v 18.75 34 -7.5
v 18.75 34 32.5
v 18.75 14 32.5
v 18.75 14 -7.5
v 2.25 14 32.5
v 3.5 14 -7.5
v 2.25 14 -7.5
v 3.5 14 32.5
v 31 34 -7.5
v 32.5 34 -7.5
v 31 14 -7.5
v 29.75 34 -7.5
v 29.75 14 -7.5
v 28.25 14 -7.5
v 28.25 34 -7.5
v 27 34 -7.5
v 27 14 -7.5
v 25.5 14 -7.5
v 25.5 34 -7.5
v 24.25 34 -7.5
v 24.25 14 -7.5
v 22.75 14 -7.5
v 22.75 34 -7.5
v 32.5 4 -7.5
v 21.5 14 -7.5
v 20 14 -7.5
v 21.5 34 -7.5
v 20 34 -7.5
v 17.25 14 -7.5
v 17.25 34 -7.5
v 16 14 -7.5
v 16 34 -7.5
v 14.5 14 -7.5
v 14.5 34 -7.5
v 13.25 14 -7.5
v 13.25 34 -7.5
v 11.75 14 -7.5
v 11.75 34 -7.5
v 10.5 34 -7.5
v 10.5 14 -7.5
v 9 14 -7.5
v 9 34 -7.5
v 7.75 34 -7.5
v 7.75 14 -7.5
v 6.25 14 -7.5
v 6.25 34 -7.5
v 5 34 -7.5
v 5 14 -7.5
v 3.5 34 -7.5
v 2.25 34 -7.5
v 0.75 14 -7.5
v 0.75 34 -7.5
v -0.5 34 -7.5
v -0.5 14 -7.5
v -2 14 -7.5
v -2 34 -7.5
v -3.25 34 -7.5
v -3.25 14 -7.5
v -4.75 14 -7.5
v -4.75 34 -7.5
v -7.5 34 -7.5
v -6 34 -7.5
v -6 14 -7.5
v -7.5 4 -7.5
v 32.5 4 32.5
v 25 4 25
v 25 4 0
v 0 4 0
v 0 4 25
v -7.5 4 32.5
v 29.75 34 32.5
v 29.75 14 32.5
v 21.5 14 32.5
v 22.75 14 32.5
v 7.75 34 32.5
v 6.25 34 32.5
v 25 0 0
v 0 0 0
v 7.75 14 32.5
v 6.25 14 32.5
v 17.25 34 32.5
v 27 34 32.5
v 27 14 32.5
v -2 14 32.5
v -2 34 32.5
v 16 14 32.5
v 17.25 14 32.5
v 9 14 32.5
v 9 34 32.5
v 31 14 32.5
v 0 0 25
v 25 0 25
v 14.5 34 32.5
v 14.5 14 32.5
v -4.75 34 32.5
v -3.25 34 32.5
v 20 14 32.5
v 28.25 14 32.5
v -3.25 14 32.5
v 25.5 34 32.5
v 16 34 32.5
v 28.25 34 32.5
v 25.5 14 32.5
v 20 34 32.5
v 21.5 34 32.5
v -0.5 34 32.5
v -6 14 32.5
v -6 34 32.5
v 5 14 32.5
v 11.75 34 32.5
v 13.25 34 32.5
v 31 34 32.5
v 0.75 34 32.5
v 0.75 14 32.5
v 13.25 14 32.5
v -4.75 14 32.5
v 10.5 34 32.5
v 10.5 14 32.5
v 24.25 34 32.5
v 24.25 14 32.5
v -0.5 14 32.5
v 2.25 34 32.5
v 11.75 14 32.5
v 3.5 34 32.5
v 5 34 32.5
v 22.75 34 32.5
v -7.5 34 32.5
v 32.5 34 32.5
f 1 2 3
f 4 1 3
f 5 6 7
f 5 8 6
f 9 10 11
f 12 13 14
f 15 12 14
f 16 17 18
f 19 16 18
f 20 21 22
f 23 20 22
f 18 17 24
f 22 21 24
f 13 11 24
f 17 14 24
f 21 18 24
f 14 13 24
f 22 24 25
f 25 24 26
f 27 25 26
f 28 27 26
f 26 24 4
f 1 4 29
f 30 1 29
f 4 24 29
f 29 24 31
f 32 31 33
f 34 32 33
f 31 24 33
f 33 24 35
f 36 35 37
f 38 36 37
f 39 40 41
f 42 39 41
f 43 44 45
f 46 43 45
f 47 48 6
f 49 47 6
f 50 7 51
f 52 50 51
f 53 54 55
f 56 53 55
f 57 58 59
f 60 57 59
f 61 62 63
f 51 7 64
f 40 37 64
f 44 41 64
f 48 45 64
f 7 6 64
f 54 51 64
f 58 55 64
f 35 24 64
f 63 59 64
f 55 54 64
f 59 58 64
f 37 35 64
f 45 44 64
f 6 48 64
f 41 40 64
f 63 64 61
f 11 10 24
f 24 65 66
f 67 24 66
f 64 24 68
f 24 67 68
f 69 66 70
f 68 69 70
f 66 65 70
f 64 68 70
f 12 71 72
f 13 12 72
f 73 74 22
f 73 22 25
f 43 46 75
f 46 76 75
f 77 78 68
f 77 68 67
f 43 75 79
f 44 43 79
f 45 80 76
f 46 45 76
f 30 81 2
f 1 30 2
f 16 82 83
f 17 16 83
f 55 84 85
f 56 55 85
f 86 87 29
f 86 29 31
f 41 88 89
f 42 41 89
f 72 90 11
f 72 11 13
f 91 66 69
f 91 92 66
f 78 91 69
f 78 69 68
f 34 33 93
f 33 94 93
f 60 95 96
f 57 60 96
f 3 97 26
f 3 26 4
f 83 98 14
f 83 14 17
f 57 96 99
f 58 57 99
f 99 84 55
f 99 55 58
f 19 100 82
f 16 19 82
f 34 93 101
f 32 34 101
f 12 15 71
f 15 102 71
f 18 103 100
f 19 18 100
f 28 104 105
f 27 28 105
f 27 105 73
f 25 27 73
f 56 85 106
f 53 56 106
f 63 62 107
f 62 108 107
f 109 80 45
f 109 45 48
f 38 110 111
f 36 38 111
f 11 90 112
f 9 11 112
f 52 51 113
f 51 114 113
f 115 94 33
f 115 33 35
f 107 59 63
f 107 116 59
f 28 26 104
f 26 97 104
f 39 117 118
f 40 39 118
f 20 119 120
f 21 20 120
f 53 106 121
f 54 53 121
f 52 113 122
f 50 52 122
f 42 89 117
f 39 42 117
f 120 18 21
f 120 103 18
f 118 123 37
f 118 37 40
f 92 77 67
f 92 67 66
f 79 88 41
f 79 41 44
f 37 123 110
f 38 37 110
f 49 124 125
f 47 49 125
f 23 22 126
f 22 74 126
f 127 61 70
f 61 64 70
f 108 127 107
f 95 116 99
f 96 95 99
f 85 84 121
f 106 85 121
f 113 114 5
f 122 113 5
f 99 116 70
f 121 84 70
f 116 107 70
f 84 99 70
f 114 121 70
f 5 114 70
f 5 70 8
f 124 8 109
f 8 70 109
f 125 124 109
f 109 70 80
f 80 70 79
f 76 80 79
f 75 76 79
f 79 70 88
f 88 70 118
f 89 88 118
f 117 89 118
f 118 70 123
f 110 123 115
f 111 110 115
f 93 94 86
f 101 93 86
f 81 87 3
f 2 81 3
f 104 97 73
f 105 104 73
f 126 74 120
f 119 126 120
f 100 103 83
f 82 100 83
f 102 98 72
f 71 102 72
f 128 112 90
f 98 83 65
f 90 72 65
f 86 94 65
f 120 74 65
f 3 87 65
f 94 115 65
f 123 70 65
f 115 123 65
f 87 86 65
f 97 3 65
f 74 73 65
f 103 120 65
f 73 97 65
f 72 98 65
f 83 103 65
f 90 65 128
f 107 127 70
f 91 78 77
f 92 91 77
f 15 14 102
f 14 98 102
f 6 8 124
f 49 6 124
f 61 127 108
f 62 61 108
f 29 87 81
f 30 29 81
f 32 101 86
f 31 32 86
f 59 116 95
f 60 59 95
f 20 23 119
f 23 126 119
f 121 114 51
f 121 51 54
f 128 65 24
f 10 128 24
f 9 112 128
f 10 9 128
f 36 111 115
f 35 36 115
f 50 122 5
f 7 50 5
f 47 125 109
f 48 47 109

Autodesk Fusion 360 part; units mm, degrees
sketch "Sketch1" plane through (0, 0, 0) normal (0, 1, 0) x (1, 0, 0)
  line L0 (0, 0) -> (25, 0)
  line L1 (25, 0) -> (25, -25)
  line L2 (25, -25) -> (0, -25)
  line L3 (0, -25) -> (0, 0)
  dimension "d1" = 25
  dimension "d2" = 25
extrude "Extrude1" add sketch "Sketch1" along normal blind 4
sketch "Sketch2" plane through (0, 4, 0) normal (0, 1, 0) x (-1, 0, 0)
  line L0 (0, 25) -> (-25, 25)
  line L1 (-25, 25) -> (-25, 0)
  line L2 (-25, 0) -> (0, 0)
  line L3 (0, 0) -> (0, 25)
  line L4 (-32.5, 32.5) -> (-32.5, -7.5)
  line L5 (-32.5, -7.5) -> (7.5, -7.5)
  line L6 (7.5, -7.5) -> (7.5, 32.5)
  line L7 (7.5, 32.5) -> (-32.5, 32.5)
  line L8 (-32.5, 32.5) -> (-12.5, 32.5)
  dimension "d6" = 40
extrude "Extrude2" add sketch "Sketch2" along normal blind 10 contours L0 L1 L2 L3 | L4 L5 L6 L7 L8
sketch "Sketch3" plane through (0, 0, 32.5) normal (0, 0, 1) x (-1, 0, 0)
  line L0 (7.5, -4) -> (-32.5, -4)
  line L1 (-32.5, -4) -> (-32.5, -14)
  line L2 (-32.5, -14) -> (7.5, -14)
  line L3 (7.5, -14) -> (7.5, -4)
sketch "Sketch4" plane through (0, 0, 32.5) normal (0, 0, 1) x (-1, 0, 0)
  line L0 (7.5, -14) -> (7.5, -34)
  line L1 (7.5, -34) -> (5.5, -34)
  line L2 (5.5, -34) -> (5.5, -14)
  line L3 (5.5, -14) -> (7.5, -14)
  line L4 (3.28, -14) -> (3.28, -34)
  line L5 (3.28, -34) -> (1.28, -34)
  line L6 (1.28, -34) -> (1.28, -14)
  line L7 (-0.94, -14) -> (-0.94, -34)
  line L8 (-0.94, -34) -> (-2.94, -34)
  line L9 (-2.94, -34) -> (-2.94, -14)
  line L10 (-5.16, -14) -> (-5.16, -34)
  line L11 (-5.16, -34) -> (-7.16, -34)
  line L12 (-7.16, -34) -> (-7.16, -14)
  line L13 (-9.38, -14) -> (-9.38, -34)
  line L14 (-9.38, -34) -> (-11.38, -34)
  line L15 (-11.38, -34) -> (-11.38, -14)
  line L16 (-13.6, -14) -> (-13.6, -34)
  line L17 (-13.6, -34) -> (-15.6, -34)
  line L18 (-15.6, -34) -> (-15.6, -14)
  line L19 (-17.82, -14) -> (-17.82, -34)
  line L20 (-17.82, -34) -> (-19.82, -34)
  line L21 (-19.82, -34) -> (-19.82, -14)
  line L22 (-22.04, -14) -> (-22.04, -34)
  line L23 (-22.04, -34) -> (-24.04, -34)
  line L24 (-24.04, -34) -> (-24.04, -14)
  line L25 (-26.26, -14) -> (-26.26, -34)
  line L26 (-26.26, -34) -> (-28.26, -34)
  line L27 (-28.26, -34) -> (-28.26, -14)
  line L28 (-30.48, -14) -> (-30.48, -34)
  line L29 (-30.48, -34) -> (-32.48, -34)
  line L30 (-32.48, -34) -> (-32.48, -14)
  line L31 (7.5, -14) -> (-32.48, -14)
  line L32 (-32.48, -14) -> (7.5, -14)
  dimension "d11" = 20
  dimension "d12" = 2
  dimension "d15" = -4.22
  dimension "d16" = 0
sketch "Sketch5" plane through (0, 0, 32.5) normal (0, 0, 1) x (-1, 0, 0)
  line L0 (7.5, -14) -> (-32.5, -14)
  line L1 (7.5, -14) -> (7.5, -34)
  line L2 (7.5, -34) -> (6, -34)
  line L3 (6, -34) -> (6, -14)
  line L4 (7.5, -14) -> (6, -14)
  line L5 (4.75, -14) -> (4.75, -34)
  line L6 (3.25, -34) -> (3.25, -14)
  line L7 (4.75, -34) -> (3.25, -34)
  line L8 (2, -14) -> (2, -34)
  line L9 (0.5, -34) -> (0.5, -14)
  line L10 (2, -34) -> (0.5, -34)
  line L11 (-0.75, -14) -> (-0.75, -34)
  line L12 (-2.25, -34) -> (-2.25, -14)
  line L13 (-0.75, -34) -> (-2.25, -34)
  line L14 (-3.5, -14) -> (-3.5, -34)
  line L15 (-5, -34) -> (-5, -14)
  line L16 (-3.5, -34) -> (-5, -34)
  line L17 (-6.25, -14) -> (-6.25, -34)
  line L18 (-7.75, -34) -> (-7.75, -14)
  line L19 (-6.25, -34) -> (-7.75, -34)
  line L20 (-9, -14) -> (-9, -34)
  line L21 (-10.5, -34) -> (-10.5, -14)
  line L22 (-9, -34) -> (-10.5, -34)
  line L23 (-11.75, -14) -> (-11.75, -34)
  line L24 (-13.25, -34) -> (-13.25, -14)
  line L25 (-11.75, -34) -> (-13.25, -34)
  line L26 (-14.5, -14) -> (-14.5, -34)
  line L27 (-16, -34) -> (-16, -14)
  line L28 (-14.5, -34) -> (-16, -34)
  line L29 (-17.25, -14) -> (-17.25, -34)
  line L30 (-18.75, -34) -> (-18.75, -14)
  line L31 (-17.25, -34) -> (-18.75, -34)
  line L32 (-20, -14) -> (-20, -34)
  line L33 (-21.5, -34) -> (-21.5, -14)
  line L34 (-20, -34) -> (-21.5, -34)
  line L35 (-22.75, -14) -> (-22.75, -34)
  line L36 (-24.25, -34) -> (-24.25, -14)
  line L37 (-22.75, -34) -> (-24.25, -34)
  line L38 (-25.5, -14) -> (-25.5, -34)
  line L39 (-27, -34) -> (-27, -14)
  line L40 (-25.5, -34) -> (-27, -34)
  line L41 (-28.25, -14) -> (-28.25, -34)
  line L42 (-29.75, -34) -> (-29.75, -14)
  line L43 (-28.25, -34) -> (-29.75, -34)
  line L44 (-31, -14) -> (-31, -34)
  line L45 (-32.5, -34) -> (-32.5, -14)
  line L46 (-31, -34) -> (-32.5, -34)
  dimension "d19" = 20
  dimension "d22" = -2.75
  dimension "d23" = 0
extrude "Extrude4" add sketch "Sketch5" against normal blind 40
